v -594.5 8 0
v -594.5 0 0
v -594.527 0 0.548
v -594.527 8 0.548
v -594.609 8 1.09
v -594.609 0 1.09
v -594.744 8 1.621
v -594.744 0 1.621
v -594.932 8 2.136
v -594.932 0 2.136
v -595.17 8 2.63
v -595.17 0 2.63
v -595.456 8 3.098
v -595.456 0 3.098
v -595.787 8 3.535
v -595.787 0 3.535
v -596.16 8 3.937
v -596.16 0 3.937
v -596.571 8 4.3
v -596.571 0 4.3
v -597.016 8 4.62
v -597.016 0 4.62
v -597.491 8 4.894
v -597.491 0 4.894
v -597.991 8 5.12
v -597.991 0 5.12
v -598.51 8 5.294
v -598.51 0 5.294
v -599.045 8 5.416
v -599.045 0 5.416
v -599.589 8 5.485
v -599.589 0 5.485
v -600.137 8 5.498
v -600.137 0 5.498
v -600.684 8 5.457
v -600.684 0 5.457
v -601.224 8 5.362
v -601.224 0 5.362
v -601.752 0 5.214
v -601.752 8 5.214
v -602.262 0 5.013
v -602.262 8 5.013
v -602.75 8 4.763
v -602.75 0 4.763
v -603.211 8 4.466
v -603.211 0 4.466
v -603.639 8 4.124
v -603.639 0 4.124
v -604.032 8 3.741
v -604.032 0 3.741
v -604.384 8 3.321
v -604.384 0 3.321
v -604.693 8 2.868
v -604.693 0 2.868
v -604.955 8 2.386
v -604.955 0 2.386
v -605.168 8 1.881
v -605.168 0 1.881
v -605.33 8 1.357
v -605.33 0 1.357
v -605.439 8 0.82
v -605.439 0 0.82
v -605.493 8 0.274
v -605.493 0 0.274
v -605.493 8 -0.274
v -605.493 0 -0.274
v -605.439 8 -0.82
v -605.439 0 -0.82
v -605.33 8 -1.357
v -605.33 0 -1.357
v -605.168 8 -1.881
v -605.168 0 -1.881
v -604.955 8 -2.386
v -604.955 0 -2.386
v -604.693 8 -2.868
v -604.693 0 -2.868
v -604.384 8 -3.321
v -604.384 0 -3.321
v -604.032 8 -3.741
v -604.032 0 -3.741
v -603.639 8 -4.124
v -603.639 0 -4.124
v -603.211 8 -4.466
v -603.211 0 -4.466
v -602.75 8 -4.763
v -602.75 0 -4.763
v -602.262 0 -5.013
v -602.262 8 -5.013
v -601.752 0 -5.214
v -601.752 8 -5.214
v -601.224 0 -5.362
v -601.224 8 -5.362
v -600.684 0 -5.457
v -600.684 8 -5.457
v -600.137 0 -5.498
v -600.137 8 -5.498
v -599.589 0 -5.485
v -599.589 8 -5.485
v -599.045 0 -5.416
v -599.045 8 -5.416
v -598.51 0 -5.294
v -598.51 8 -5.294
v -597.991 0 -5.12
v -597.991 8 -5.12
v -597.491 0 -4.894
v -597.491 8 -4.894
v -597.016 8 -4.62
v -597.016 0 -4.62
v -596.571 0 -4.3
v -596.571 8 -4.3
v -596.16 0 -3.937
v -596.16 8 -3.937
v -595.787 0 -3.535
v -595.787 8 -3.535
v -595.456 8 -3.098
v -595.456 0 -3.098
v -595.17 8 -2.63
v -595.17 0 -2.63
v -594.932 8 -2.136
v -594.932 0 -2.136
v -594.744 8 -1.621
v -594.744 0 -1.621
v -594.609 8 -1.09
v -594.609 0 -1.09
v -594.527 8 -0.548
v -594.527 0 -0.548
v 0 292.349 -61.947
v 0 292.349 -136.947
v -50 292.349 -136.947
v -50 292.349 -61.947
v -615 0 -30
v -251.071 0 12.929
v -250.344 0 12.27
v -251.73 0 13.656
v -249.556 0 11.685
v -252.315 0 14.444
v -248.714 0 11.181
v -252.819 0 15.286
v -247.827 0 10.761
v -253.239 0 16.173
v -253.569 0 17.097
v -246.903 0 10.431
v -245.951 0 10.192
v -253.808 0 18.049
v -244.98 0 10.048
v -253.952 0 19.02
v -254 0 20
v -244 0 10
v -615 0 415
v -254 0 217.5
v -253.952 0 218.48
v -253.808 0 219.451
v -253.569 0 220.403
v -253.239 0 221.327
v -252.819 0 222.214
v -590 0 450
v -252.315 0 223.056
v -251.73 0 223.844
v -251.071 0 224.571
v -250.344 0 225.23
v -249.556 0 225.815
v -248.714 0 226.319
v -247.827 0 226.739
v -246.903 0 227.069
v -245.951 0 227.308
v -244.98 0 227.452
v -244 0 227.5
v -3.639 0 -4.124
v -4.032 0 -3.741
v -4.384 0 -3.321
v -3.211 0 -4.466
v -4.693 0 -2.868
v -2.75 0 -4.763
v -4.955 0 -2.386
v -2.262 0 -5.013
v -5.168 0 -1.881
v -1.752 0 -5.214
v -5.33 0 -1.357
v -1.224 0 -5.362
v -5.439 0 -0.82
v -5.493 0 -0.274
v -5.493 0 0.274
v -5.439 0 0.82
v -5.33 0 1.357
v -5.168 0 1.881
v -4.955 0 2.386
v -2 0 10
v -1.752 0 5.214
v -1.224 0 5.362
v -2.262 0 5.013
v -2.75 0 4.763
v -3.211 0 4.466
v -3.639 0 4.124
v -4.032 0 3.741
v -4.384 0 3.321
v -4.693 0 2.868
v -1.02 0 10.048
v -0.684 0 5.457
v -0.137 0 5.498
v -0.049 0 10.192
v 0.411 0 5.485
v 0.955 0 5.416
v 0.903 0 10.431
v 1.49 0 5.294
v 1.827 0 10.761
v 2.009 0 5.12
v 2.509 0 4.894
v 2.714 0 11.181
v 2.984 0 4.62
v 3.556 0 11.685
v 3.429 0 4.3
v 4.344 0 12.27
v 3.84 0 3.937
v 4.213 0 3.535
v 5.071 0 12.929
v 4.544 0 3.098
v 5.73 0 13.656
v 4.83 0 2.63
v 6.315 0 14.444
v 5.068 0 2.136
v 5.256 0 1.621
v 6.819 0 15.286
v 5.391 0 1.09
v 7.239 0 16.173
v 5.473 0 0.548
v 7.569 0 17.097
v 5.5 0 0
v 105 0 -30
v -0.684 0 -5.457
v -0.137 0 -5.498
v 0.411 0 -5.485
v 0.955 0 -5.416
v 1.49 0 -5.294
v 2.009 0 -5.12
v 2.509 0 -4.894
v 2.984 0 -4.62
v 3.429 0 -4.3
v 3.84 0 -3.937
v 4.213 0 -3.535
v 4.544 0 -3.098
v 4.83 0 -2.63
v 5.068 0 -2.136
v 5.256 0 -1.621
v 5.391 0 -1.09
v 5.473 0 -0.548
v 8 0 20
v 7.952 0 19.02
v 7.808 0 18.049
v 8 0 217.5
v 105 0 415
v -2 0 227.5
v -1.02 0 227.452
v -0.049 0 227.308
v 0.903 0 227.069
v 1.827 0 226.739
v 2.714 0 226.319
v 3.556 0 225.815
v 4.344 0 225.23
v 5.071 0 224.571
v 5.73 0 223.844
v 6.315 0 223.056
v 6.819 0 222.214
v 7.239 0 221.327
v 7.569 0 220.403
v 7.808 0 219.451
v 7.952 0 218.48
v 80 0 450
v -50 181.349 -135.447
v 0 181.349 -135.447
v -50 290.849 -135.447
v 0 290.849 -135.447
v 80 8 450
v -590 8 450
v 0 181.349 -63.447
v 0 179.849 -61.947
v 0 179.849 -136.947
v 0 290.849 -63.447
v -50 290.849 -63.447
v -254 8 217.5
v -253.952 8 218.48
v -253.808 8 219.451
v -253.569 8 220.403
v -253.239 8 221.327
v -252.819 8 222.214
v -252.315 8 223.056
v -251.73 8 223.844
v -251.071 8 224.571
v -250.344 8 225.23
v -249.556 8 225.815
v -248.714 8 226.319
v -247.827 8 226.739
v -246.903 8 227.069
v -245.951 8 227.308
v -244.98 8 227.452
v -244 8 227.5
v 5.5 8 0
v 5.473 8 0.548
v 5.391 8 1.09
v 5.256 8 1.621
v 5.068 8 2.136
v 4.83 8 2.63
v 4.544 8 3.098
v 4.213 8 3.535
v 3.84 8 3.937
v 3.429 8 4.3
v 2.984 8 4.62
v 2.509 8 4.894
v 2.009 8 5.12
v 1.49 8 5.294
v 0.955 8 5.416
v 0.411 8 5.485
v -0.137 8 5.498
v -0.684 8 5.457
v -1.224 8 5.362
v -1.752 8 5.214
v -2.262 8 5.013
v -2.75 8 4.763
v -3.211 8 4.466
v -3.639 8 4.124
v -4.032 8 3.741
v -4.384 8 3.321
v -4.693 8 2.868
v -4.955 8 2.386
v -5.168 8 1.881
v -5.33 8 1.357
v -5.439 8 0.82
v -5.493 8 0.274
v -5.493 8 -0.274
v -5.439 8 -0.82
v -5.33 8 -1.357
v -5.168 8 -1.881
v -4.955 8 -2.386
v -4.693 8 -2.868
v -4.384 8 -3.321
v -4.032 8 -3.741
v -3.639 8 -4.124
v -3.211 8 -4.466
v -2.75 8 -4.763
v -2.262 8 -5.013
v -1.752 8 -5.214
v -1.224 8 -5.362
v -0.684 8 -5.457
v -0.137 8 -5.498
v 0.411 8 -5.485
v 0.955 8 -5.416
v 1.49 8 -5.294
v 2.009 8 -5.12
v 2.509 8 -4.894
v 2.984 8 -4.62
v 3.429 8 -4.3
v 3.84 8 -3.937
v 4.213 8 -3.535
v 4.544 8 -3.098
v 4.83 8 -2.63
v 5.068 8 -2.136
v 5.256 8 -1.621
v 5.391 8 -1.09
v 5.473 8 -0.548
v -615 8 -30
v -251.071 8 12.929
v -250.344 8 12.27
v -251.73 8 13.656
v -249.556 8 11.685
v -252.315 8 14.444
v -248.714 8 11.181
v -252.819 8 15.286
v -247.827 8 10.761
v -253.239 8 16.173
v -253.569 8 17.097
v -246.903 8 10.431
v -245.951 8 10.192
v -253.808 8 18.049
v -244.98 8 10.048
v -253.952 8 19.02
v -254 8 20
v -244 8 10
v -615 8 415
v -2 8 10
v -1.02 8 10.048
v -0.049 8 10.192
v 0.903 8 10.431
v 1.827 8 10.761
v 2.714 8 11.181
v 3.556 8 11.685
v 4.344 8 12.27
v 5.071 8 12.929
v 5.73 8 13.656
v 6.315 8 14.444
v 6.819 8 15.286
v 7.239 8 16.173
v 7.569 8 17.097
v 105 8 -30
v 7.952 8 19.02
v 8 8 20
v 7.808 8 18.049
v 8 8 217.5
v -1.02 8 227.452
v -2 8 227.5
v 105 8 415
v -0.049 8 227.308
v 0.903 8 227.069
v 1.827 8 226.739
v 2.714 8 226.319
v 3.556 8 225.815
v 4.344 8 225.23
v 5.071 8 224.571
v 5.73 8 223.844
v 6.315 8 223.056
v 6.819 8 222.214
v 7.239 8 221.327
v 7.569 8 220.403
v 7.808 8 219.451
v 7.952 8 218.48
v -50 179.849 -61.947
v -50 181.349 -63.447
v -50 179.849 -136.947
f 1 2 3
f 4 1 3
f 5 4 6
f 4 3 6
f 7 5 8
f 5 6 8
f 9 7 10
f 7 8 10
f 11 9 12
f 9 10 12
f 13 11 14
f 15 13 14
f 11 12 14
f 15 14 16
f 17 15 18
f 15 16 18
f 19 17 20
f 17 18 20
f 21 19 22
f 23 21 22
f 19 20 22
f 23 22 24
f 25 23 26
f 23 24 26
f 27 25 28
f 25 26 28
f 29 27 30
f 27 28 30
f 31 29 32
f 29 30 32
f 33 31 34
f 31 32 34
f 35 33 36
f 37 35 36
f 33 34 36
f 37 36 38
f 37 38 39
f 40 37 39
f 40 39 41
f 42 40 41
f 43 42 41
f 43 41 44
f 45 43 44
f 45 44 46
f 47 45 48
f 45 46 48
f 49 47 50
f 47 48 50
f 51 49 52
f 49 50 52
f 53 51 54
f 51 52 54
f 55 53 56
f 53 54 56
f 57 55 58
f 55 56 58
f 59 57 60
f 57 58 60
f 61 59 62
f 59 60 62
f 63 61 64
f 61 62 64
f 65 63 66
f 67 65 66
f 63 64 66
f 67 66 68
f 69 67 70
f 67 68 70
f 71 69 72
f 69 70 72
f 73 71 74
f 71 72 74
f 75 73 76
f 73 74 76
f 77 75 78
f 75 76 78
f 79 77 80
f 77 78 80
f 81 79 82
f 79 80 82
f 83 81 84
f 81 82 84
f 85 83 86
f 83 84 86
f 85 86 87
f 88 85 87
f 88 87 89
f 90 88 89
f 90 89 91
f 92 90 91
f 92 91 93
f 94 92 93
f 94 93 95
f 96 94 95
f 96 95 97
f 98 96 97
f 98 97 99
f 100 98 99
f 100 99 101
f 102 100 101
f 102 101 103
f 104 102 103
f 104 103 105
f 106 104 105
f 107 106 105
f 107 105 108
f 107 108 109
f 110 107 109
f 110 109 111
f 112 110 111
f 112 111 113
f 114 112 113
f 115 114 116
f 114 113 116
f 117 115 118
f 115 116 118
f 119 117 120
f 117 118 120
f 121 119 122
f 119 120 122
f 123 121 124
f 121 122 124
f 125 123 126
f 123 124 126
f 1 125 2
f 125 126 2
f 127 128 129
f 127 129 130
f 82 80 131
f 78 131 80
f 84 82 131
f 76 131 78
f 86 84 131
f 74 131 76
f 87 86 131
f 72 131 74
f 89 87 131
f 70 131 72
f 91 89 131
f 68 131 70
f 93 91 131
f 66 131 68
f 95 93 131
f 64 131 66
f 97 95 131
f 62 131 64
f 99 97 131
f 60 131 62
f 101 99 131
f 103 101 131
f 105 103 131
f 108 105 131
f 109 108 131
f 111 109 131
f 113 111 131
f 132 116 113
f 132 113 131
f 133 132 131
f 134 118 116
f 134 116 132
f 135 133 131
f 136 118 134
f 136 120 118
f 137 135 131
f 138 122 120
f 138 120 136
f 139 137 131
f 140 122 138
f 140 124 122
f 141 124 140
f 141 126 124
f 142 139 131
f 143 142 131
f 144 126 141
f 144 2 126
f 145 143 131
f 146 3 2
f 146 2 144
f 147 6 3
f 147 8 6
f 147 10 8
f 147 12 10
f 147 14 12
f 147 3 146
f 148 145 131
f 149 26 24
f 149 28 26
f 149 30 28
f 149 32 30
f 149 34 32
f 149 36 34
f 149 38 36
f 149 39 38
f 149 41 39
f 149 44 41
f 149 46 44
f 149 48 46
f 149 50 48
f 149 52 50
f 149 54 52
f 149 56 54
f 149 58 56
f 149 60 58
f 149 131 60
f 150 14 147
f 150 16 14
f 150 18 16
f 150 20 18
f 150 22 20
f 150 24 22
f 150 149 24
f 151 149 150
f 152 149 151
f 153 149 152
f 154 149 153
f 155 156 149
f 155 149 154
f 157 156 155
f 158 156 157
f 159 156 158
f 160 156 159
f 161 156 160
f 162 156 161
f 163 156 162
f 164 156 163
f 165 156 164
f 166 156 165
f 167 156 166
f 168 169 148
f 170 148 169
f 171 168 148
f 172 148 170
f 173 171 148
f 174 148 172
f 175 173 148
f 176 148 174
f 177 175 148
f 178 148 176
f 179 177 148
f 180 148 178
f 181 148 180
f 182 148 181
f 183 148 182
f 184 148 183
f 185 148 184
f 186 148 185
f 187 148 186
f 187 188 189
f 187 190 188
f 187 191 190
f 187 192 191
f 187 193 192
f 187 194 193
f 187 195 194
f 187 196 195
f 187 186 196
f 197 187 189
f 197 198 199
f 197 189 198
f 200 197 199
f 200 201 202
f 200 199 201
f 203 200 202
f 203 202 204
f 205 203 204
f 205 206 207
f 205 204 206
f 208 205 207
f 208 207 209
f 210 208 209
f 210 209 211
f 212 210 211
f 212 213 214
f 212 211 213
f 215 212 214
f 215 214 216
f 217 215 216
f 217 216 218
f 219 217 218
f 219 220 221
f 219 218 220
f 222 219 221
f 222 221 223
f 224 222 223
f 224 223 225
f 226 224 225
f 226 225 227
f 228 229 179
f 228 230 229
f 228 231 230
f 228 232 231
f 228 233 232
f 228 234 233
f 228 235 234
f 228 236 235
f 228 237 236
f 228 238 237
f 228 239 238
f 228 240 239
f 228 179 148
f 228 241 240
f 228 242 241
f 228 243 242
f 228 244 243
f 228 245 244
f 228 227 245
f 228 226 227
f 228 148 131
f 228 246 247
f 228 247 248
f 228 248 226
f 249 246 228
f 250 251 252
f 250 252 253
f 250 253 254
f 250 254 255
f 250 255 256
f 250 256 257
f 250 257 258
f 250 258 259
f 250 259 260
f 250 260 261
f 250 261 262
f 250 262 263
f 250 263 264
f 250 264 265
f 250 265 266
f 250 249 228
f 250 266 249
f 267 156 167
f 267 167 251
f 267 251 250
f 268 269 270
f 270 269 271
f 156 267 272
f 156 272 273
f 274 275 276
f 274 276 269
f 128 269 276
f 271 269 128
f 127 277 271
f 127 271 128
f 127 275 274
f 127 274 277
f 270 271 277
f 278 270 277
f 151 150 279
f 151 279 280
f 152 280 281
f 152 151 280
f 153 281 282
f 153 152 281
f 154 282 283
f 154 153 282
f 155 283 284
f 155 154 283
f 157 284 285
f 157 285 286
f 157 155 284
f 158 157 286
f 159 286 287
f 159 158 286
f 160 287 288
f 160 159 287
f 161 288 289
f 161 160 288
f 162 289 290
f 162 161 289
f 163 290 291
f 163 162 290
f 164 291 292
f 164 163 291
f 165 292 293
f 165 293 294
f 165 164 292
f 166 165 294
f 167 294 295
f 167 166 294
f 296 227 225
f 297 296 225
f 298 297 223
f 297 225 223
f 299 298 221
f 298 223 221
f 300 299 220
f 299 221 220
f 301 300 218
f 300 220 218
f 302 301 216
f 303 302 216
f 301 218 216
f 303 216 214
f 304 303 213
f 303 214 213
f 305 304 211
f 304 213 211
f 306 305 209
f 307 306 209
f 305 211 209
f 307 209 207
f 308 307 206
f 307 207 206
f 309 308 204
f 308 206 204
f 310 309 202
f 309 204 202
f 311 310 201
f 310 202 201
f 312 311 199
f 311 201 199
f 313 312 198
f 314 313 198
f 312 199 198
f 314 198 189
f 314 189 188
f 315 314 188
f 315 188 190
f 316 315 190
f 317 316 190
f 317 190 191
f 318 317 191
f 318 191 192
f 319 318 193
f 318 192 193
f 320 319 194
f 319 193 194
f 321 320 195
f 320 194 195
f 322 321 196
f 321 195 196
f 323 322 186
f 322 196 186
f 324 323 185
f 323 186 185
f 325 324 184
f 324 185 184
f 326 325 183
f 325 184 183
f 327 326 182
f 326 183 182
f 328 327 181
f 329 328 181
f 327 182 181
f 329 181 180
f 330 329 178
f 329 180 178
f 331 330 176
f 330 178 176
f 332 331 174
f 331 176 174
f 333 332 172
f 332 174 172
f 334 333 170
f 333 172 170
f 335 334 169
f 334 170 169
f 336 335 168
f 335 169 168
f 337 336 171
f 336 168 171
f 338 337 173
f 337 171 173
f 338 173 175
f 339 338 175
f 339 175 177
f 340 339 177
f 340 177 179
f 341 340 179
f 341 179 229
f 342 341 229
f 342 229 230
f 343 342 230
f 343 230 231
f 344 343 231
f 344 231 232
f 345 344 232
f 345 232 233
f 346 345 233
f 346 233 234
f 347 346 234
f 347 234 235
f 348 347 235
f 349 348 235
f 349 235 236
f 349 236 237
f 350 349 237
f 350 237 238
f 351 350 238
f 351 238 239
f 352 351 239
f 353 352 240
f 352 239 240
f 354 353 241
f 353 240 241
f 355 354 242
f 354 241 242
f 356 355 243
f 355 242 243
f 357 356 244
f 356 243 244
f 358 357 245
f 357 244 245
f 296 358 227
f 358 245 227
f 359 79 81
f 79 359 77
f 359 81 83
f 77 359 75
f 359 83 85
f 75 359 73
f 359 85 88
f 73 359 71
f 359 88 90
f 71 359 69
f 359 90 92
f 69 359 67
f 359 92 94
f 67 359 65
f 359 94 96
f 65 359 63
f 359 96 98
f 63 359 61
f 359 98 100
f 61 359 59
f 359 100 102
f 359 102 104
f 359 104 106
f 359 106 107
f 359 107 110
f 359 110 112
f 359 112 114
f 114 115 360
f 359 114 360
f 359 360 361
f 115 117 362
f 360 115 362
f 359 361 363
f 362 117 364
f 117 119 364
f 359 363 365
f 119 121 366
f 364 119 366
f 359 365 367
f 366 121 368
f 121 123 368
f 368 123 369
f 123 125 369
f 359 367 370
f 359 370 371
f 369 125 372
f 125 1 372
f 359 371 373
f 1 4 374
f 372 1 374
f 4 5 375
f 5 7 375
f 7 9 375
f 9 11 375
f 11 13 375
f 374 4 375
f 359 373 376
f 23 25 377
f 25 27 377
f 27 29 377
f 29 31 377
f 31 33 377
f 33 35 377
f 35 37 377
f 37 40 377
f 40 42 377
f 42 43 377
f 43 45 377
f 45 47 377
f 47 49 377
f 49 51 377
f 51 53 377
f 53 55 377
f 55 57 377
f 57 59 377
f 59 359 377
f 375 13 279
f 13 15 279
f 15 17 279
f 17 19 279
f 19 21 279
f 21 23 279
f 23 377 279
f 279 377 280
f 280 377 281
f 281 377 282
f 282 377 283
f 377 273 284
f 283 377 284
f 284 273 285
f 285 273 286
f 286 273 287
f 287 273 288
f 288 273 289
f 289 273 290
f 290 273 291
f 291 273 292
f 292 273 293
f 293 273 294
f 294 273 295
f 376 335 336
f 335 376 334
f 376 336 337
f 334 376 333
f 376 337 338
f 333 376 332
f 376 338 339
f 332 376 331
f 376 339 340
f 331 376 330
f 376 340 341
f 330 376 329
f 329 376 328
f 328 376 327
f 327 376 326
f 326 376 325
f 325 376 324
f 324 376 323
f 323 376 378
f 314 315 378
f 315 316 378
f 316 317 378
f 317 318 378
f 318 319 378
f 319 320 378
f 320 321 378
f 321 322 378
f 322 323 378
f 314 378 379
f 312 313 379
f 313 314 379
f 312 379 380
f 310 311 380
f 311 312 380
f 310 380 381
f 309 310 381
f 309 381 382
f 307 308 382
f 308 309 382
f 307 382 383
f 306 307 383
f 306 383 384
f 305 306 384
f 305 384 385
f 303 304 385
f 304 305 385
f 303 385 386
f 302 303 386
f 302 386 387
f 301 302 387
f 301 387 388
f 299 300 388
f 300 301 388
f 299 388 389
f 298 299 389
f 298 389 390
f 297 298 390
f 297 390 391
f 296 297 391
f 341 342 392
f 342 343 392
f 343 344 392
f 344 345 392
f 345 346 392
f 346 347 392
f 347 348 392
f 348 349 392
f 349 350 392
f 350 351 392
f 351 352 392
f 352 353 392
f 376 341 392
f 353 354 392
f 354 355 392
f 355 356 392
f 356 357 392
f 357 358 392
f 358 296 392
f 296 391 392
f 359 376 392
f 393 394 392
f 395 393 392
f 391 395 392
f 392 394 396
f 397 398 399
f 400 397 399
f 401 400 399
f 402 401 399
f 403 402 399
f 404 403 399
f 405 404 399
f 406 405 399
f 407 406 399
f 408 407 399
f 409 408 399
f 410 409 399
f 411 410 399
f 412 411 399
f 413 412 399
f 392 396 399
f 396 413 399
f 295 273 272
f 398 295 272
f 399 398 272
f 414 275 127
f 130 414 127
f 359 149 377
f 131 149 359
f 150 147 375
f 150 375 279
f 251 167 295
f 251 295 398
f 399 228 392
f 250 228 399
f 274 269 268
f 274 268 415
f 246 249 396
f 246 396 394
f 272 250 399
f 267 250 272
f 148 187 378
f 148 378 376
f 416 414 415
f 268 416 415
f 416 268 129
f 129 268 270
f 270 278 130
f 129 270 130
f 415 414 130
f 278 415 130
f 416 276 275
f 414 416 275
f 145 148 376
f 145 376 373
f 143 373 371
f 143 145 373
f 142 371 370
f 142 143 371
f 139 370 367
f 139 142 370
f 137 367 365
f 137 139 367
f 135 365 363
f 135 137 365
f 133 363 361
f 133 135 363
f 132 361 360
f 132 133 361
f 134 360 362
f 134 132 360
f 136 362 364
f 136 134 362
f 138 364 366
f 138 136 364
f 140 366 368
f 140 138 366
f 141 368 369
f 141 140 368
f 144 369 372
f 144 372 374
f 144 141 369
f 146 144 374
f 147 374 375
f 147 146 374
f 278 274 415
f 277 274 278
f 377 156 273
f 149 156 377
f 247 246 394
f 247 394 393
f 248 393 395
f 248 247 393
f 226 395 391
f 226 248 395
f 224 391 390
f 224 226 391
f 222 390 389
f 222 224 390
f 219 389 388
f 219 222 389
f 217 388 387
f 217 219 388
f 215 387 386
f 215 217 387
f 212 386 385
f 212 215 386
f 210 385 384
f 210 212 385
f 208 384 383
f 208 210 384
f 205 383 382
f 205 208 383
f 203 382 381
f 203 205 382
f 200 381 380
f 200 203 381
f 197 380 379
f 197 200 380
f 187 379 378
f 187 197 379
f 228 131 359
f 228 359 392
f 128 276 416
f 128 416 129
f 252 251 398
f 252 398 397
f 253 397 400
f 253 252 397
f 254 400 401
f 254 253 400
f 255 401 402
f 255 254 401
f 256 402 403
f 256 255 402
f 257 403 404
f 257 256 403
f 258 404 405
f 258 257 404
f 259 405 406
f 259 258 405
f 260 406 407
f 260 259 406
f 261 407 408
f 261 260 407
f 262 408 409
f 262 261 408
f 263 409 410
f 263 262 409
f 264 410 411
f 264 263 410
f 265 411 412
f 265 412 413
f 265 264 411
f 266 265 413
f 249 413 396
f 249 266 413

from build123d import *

# Parameters (mm, degrees)
F1_R     = 5.5
F2_DEPTH = 8
F3_W     = 112.5
F3_H     = 75
F3_W_2   = 109.5
F3_H_2   = 72
F4_DEPTH = 50


with BuildPart() as f2:
    # F1 (on Front) → F2 (new body)
    with BuildSketch(Plane.XZ):
        Polygon((80, 450), (-590, 450), (-615, 415), (-615, -30), (105, -30), (105, 415), align=None)
        with Locations((-600, 0)):
            Circle(F1_R, mode=Mode.SUBTRACT)
        Circle(F1_R, mode=Mode.SUBTRACT)
        with BuildLine():
            ThreePointArc((-254, 217.5), (-251.0710678119, 224.5710678119), (-244, 227.5))
            Line((-244, 227.5), (-2, 227.5))
            ThreePointArc((-2, 227.5), (5.0710678119, 224.5710678119), (8, 217.5))
            Line((8, 217.5), (8, 20))
            ThreePointArc((8, 20), (5.0710678119, 12.9289321881), (-2, 10))
            Line((-2, 10), (-244, 10))
            ThreePointArc((-244, 10), (-251.0710678119, 12.9289321881), (-254, 20))
            Line((-254, 20), (-254, 217.5))
        make_face(mode=Mode.SUBTRACT)
    extrude(amount=-F2_DEPTH)


with BuildPart() as f4:
    # F3 (on Right) → F4 (new body)
    with BuildSketch(Plane.YZ):
        with Locations((236.0989015299, -99.447497502)):
            Rectangle(F3_W, F3_H)
        with Locations((236.0989015299, -99.447497502)):
            Rectangle(F3_W_2, F3_H_2, mode=Mode.SUBTRACT)
    extrude(amount=-F4_DEPTH)


solid = Compound([f2.part, f4.part])
